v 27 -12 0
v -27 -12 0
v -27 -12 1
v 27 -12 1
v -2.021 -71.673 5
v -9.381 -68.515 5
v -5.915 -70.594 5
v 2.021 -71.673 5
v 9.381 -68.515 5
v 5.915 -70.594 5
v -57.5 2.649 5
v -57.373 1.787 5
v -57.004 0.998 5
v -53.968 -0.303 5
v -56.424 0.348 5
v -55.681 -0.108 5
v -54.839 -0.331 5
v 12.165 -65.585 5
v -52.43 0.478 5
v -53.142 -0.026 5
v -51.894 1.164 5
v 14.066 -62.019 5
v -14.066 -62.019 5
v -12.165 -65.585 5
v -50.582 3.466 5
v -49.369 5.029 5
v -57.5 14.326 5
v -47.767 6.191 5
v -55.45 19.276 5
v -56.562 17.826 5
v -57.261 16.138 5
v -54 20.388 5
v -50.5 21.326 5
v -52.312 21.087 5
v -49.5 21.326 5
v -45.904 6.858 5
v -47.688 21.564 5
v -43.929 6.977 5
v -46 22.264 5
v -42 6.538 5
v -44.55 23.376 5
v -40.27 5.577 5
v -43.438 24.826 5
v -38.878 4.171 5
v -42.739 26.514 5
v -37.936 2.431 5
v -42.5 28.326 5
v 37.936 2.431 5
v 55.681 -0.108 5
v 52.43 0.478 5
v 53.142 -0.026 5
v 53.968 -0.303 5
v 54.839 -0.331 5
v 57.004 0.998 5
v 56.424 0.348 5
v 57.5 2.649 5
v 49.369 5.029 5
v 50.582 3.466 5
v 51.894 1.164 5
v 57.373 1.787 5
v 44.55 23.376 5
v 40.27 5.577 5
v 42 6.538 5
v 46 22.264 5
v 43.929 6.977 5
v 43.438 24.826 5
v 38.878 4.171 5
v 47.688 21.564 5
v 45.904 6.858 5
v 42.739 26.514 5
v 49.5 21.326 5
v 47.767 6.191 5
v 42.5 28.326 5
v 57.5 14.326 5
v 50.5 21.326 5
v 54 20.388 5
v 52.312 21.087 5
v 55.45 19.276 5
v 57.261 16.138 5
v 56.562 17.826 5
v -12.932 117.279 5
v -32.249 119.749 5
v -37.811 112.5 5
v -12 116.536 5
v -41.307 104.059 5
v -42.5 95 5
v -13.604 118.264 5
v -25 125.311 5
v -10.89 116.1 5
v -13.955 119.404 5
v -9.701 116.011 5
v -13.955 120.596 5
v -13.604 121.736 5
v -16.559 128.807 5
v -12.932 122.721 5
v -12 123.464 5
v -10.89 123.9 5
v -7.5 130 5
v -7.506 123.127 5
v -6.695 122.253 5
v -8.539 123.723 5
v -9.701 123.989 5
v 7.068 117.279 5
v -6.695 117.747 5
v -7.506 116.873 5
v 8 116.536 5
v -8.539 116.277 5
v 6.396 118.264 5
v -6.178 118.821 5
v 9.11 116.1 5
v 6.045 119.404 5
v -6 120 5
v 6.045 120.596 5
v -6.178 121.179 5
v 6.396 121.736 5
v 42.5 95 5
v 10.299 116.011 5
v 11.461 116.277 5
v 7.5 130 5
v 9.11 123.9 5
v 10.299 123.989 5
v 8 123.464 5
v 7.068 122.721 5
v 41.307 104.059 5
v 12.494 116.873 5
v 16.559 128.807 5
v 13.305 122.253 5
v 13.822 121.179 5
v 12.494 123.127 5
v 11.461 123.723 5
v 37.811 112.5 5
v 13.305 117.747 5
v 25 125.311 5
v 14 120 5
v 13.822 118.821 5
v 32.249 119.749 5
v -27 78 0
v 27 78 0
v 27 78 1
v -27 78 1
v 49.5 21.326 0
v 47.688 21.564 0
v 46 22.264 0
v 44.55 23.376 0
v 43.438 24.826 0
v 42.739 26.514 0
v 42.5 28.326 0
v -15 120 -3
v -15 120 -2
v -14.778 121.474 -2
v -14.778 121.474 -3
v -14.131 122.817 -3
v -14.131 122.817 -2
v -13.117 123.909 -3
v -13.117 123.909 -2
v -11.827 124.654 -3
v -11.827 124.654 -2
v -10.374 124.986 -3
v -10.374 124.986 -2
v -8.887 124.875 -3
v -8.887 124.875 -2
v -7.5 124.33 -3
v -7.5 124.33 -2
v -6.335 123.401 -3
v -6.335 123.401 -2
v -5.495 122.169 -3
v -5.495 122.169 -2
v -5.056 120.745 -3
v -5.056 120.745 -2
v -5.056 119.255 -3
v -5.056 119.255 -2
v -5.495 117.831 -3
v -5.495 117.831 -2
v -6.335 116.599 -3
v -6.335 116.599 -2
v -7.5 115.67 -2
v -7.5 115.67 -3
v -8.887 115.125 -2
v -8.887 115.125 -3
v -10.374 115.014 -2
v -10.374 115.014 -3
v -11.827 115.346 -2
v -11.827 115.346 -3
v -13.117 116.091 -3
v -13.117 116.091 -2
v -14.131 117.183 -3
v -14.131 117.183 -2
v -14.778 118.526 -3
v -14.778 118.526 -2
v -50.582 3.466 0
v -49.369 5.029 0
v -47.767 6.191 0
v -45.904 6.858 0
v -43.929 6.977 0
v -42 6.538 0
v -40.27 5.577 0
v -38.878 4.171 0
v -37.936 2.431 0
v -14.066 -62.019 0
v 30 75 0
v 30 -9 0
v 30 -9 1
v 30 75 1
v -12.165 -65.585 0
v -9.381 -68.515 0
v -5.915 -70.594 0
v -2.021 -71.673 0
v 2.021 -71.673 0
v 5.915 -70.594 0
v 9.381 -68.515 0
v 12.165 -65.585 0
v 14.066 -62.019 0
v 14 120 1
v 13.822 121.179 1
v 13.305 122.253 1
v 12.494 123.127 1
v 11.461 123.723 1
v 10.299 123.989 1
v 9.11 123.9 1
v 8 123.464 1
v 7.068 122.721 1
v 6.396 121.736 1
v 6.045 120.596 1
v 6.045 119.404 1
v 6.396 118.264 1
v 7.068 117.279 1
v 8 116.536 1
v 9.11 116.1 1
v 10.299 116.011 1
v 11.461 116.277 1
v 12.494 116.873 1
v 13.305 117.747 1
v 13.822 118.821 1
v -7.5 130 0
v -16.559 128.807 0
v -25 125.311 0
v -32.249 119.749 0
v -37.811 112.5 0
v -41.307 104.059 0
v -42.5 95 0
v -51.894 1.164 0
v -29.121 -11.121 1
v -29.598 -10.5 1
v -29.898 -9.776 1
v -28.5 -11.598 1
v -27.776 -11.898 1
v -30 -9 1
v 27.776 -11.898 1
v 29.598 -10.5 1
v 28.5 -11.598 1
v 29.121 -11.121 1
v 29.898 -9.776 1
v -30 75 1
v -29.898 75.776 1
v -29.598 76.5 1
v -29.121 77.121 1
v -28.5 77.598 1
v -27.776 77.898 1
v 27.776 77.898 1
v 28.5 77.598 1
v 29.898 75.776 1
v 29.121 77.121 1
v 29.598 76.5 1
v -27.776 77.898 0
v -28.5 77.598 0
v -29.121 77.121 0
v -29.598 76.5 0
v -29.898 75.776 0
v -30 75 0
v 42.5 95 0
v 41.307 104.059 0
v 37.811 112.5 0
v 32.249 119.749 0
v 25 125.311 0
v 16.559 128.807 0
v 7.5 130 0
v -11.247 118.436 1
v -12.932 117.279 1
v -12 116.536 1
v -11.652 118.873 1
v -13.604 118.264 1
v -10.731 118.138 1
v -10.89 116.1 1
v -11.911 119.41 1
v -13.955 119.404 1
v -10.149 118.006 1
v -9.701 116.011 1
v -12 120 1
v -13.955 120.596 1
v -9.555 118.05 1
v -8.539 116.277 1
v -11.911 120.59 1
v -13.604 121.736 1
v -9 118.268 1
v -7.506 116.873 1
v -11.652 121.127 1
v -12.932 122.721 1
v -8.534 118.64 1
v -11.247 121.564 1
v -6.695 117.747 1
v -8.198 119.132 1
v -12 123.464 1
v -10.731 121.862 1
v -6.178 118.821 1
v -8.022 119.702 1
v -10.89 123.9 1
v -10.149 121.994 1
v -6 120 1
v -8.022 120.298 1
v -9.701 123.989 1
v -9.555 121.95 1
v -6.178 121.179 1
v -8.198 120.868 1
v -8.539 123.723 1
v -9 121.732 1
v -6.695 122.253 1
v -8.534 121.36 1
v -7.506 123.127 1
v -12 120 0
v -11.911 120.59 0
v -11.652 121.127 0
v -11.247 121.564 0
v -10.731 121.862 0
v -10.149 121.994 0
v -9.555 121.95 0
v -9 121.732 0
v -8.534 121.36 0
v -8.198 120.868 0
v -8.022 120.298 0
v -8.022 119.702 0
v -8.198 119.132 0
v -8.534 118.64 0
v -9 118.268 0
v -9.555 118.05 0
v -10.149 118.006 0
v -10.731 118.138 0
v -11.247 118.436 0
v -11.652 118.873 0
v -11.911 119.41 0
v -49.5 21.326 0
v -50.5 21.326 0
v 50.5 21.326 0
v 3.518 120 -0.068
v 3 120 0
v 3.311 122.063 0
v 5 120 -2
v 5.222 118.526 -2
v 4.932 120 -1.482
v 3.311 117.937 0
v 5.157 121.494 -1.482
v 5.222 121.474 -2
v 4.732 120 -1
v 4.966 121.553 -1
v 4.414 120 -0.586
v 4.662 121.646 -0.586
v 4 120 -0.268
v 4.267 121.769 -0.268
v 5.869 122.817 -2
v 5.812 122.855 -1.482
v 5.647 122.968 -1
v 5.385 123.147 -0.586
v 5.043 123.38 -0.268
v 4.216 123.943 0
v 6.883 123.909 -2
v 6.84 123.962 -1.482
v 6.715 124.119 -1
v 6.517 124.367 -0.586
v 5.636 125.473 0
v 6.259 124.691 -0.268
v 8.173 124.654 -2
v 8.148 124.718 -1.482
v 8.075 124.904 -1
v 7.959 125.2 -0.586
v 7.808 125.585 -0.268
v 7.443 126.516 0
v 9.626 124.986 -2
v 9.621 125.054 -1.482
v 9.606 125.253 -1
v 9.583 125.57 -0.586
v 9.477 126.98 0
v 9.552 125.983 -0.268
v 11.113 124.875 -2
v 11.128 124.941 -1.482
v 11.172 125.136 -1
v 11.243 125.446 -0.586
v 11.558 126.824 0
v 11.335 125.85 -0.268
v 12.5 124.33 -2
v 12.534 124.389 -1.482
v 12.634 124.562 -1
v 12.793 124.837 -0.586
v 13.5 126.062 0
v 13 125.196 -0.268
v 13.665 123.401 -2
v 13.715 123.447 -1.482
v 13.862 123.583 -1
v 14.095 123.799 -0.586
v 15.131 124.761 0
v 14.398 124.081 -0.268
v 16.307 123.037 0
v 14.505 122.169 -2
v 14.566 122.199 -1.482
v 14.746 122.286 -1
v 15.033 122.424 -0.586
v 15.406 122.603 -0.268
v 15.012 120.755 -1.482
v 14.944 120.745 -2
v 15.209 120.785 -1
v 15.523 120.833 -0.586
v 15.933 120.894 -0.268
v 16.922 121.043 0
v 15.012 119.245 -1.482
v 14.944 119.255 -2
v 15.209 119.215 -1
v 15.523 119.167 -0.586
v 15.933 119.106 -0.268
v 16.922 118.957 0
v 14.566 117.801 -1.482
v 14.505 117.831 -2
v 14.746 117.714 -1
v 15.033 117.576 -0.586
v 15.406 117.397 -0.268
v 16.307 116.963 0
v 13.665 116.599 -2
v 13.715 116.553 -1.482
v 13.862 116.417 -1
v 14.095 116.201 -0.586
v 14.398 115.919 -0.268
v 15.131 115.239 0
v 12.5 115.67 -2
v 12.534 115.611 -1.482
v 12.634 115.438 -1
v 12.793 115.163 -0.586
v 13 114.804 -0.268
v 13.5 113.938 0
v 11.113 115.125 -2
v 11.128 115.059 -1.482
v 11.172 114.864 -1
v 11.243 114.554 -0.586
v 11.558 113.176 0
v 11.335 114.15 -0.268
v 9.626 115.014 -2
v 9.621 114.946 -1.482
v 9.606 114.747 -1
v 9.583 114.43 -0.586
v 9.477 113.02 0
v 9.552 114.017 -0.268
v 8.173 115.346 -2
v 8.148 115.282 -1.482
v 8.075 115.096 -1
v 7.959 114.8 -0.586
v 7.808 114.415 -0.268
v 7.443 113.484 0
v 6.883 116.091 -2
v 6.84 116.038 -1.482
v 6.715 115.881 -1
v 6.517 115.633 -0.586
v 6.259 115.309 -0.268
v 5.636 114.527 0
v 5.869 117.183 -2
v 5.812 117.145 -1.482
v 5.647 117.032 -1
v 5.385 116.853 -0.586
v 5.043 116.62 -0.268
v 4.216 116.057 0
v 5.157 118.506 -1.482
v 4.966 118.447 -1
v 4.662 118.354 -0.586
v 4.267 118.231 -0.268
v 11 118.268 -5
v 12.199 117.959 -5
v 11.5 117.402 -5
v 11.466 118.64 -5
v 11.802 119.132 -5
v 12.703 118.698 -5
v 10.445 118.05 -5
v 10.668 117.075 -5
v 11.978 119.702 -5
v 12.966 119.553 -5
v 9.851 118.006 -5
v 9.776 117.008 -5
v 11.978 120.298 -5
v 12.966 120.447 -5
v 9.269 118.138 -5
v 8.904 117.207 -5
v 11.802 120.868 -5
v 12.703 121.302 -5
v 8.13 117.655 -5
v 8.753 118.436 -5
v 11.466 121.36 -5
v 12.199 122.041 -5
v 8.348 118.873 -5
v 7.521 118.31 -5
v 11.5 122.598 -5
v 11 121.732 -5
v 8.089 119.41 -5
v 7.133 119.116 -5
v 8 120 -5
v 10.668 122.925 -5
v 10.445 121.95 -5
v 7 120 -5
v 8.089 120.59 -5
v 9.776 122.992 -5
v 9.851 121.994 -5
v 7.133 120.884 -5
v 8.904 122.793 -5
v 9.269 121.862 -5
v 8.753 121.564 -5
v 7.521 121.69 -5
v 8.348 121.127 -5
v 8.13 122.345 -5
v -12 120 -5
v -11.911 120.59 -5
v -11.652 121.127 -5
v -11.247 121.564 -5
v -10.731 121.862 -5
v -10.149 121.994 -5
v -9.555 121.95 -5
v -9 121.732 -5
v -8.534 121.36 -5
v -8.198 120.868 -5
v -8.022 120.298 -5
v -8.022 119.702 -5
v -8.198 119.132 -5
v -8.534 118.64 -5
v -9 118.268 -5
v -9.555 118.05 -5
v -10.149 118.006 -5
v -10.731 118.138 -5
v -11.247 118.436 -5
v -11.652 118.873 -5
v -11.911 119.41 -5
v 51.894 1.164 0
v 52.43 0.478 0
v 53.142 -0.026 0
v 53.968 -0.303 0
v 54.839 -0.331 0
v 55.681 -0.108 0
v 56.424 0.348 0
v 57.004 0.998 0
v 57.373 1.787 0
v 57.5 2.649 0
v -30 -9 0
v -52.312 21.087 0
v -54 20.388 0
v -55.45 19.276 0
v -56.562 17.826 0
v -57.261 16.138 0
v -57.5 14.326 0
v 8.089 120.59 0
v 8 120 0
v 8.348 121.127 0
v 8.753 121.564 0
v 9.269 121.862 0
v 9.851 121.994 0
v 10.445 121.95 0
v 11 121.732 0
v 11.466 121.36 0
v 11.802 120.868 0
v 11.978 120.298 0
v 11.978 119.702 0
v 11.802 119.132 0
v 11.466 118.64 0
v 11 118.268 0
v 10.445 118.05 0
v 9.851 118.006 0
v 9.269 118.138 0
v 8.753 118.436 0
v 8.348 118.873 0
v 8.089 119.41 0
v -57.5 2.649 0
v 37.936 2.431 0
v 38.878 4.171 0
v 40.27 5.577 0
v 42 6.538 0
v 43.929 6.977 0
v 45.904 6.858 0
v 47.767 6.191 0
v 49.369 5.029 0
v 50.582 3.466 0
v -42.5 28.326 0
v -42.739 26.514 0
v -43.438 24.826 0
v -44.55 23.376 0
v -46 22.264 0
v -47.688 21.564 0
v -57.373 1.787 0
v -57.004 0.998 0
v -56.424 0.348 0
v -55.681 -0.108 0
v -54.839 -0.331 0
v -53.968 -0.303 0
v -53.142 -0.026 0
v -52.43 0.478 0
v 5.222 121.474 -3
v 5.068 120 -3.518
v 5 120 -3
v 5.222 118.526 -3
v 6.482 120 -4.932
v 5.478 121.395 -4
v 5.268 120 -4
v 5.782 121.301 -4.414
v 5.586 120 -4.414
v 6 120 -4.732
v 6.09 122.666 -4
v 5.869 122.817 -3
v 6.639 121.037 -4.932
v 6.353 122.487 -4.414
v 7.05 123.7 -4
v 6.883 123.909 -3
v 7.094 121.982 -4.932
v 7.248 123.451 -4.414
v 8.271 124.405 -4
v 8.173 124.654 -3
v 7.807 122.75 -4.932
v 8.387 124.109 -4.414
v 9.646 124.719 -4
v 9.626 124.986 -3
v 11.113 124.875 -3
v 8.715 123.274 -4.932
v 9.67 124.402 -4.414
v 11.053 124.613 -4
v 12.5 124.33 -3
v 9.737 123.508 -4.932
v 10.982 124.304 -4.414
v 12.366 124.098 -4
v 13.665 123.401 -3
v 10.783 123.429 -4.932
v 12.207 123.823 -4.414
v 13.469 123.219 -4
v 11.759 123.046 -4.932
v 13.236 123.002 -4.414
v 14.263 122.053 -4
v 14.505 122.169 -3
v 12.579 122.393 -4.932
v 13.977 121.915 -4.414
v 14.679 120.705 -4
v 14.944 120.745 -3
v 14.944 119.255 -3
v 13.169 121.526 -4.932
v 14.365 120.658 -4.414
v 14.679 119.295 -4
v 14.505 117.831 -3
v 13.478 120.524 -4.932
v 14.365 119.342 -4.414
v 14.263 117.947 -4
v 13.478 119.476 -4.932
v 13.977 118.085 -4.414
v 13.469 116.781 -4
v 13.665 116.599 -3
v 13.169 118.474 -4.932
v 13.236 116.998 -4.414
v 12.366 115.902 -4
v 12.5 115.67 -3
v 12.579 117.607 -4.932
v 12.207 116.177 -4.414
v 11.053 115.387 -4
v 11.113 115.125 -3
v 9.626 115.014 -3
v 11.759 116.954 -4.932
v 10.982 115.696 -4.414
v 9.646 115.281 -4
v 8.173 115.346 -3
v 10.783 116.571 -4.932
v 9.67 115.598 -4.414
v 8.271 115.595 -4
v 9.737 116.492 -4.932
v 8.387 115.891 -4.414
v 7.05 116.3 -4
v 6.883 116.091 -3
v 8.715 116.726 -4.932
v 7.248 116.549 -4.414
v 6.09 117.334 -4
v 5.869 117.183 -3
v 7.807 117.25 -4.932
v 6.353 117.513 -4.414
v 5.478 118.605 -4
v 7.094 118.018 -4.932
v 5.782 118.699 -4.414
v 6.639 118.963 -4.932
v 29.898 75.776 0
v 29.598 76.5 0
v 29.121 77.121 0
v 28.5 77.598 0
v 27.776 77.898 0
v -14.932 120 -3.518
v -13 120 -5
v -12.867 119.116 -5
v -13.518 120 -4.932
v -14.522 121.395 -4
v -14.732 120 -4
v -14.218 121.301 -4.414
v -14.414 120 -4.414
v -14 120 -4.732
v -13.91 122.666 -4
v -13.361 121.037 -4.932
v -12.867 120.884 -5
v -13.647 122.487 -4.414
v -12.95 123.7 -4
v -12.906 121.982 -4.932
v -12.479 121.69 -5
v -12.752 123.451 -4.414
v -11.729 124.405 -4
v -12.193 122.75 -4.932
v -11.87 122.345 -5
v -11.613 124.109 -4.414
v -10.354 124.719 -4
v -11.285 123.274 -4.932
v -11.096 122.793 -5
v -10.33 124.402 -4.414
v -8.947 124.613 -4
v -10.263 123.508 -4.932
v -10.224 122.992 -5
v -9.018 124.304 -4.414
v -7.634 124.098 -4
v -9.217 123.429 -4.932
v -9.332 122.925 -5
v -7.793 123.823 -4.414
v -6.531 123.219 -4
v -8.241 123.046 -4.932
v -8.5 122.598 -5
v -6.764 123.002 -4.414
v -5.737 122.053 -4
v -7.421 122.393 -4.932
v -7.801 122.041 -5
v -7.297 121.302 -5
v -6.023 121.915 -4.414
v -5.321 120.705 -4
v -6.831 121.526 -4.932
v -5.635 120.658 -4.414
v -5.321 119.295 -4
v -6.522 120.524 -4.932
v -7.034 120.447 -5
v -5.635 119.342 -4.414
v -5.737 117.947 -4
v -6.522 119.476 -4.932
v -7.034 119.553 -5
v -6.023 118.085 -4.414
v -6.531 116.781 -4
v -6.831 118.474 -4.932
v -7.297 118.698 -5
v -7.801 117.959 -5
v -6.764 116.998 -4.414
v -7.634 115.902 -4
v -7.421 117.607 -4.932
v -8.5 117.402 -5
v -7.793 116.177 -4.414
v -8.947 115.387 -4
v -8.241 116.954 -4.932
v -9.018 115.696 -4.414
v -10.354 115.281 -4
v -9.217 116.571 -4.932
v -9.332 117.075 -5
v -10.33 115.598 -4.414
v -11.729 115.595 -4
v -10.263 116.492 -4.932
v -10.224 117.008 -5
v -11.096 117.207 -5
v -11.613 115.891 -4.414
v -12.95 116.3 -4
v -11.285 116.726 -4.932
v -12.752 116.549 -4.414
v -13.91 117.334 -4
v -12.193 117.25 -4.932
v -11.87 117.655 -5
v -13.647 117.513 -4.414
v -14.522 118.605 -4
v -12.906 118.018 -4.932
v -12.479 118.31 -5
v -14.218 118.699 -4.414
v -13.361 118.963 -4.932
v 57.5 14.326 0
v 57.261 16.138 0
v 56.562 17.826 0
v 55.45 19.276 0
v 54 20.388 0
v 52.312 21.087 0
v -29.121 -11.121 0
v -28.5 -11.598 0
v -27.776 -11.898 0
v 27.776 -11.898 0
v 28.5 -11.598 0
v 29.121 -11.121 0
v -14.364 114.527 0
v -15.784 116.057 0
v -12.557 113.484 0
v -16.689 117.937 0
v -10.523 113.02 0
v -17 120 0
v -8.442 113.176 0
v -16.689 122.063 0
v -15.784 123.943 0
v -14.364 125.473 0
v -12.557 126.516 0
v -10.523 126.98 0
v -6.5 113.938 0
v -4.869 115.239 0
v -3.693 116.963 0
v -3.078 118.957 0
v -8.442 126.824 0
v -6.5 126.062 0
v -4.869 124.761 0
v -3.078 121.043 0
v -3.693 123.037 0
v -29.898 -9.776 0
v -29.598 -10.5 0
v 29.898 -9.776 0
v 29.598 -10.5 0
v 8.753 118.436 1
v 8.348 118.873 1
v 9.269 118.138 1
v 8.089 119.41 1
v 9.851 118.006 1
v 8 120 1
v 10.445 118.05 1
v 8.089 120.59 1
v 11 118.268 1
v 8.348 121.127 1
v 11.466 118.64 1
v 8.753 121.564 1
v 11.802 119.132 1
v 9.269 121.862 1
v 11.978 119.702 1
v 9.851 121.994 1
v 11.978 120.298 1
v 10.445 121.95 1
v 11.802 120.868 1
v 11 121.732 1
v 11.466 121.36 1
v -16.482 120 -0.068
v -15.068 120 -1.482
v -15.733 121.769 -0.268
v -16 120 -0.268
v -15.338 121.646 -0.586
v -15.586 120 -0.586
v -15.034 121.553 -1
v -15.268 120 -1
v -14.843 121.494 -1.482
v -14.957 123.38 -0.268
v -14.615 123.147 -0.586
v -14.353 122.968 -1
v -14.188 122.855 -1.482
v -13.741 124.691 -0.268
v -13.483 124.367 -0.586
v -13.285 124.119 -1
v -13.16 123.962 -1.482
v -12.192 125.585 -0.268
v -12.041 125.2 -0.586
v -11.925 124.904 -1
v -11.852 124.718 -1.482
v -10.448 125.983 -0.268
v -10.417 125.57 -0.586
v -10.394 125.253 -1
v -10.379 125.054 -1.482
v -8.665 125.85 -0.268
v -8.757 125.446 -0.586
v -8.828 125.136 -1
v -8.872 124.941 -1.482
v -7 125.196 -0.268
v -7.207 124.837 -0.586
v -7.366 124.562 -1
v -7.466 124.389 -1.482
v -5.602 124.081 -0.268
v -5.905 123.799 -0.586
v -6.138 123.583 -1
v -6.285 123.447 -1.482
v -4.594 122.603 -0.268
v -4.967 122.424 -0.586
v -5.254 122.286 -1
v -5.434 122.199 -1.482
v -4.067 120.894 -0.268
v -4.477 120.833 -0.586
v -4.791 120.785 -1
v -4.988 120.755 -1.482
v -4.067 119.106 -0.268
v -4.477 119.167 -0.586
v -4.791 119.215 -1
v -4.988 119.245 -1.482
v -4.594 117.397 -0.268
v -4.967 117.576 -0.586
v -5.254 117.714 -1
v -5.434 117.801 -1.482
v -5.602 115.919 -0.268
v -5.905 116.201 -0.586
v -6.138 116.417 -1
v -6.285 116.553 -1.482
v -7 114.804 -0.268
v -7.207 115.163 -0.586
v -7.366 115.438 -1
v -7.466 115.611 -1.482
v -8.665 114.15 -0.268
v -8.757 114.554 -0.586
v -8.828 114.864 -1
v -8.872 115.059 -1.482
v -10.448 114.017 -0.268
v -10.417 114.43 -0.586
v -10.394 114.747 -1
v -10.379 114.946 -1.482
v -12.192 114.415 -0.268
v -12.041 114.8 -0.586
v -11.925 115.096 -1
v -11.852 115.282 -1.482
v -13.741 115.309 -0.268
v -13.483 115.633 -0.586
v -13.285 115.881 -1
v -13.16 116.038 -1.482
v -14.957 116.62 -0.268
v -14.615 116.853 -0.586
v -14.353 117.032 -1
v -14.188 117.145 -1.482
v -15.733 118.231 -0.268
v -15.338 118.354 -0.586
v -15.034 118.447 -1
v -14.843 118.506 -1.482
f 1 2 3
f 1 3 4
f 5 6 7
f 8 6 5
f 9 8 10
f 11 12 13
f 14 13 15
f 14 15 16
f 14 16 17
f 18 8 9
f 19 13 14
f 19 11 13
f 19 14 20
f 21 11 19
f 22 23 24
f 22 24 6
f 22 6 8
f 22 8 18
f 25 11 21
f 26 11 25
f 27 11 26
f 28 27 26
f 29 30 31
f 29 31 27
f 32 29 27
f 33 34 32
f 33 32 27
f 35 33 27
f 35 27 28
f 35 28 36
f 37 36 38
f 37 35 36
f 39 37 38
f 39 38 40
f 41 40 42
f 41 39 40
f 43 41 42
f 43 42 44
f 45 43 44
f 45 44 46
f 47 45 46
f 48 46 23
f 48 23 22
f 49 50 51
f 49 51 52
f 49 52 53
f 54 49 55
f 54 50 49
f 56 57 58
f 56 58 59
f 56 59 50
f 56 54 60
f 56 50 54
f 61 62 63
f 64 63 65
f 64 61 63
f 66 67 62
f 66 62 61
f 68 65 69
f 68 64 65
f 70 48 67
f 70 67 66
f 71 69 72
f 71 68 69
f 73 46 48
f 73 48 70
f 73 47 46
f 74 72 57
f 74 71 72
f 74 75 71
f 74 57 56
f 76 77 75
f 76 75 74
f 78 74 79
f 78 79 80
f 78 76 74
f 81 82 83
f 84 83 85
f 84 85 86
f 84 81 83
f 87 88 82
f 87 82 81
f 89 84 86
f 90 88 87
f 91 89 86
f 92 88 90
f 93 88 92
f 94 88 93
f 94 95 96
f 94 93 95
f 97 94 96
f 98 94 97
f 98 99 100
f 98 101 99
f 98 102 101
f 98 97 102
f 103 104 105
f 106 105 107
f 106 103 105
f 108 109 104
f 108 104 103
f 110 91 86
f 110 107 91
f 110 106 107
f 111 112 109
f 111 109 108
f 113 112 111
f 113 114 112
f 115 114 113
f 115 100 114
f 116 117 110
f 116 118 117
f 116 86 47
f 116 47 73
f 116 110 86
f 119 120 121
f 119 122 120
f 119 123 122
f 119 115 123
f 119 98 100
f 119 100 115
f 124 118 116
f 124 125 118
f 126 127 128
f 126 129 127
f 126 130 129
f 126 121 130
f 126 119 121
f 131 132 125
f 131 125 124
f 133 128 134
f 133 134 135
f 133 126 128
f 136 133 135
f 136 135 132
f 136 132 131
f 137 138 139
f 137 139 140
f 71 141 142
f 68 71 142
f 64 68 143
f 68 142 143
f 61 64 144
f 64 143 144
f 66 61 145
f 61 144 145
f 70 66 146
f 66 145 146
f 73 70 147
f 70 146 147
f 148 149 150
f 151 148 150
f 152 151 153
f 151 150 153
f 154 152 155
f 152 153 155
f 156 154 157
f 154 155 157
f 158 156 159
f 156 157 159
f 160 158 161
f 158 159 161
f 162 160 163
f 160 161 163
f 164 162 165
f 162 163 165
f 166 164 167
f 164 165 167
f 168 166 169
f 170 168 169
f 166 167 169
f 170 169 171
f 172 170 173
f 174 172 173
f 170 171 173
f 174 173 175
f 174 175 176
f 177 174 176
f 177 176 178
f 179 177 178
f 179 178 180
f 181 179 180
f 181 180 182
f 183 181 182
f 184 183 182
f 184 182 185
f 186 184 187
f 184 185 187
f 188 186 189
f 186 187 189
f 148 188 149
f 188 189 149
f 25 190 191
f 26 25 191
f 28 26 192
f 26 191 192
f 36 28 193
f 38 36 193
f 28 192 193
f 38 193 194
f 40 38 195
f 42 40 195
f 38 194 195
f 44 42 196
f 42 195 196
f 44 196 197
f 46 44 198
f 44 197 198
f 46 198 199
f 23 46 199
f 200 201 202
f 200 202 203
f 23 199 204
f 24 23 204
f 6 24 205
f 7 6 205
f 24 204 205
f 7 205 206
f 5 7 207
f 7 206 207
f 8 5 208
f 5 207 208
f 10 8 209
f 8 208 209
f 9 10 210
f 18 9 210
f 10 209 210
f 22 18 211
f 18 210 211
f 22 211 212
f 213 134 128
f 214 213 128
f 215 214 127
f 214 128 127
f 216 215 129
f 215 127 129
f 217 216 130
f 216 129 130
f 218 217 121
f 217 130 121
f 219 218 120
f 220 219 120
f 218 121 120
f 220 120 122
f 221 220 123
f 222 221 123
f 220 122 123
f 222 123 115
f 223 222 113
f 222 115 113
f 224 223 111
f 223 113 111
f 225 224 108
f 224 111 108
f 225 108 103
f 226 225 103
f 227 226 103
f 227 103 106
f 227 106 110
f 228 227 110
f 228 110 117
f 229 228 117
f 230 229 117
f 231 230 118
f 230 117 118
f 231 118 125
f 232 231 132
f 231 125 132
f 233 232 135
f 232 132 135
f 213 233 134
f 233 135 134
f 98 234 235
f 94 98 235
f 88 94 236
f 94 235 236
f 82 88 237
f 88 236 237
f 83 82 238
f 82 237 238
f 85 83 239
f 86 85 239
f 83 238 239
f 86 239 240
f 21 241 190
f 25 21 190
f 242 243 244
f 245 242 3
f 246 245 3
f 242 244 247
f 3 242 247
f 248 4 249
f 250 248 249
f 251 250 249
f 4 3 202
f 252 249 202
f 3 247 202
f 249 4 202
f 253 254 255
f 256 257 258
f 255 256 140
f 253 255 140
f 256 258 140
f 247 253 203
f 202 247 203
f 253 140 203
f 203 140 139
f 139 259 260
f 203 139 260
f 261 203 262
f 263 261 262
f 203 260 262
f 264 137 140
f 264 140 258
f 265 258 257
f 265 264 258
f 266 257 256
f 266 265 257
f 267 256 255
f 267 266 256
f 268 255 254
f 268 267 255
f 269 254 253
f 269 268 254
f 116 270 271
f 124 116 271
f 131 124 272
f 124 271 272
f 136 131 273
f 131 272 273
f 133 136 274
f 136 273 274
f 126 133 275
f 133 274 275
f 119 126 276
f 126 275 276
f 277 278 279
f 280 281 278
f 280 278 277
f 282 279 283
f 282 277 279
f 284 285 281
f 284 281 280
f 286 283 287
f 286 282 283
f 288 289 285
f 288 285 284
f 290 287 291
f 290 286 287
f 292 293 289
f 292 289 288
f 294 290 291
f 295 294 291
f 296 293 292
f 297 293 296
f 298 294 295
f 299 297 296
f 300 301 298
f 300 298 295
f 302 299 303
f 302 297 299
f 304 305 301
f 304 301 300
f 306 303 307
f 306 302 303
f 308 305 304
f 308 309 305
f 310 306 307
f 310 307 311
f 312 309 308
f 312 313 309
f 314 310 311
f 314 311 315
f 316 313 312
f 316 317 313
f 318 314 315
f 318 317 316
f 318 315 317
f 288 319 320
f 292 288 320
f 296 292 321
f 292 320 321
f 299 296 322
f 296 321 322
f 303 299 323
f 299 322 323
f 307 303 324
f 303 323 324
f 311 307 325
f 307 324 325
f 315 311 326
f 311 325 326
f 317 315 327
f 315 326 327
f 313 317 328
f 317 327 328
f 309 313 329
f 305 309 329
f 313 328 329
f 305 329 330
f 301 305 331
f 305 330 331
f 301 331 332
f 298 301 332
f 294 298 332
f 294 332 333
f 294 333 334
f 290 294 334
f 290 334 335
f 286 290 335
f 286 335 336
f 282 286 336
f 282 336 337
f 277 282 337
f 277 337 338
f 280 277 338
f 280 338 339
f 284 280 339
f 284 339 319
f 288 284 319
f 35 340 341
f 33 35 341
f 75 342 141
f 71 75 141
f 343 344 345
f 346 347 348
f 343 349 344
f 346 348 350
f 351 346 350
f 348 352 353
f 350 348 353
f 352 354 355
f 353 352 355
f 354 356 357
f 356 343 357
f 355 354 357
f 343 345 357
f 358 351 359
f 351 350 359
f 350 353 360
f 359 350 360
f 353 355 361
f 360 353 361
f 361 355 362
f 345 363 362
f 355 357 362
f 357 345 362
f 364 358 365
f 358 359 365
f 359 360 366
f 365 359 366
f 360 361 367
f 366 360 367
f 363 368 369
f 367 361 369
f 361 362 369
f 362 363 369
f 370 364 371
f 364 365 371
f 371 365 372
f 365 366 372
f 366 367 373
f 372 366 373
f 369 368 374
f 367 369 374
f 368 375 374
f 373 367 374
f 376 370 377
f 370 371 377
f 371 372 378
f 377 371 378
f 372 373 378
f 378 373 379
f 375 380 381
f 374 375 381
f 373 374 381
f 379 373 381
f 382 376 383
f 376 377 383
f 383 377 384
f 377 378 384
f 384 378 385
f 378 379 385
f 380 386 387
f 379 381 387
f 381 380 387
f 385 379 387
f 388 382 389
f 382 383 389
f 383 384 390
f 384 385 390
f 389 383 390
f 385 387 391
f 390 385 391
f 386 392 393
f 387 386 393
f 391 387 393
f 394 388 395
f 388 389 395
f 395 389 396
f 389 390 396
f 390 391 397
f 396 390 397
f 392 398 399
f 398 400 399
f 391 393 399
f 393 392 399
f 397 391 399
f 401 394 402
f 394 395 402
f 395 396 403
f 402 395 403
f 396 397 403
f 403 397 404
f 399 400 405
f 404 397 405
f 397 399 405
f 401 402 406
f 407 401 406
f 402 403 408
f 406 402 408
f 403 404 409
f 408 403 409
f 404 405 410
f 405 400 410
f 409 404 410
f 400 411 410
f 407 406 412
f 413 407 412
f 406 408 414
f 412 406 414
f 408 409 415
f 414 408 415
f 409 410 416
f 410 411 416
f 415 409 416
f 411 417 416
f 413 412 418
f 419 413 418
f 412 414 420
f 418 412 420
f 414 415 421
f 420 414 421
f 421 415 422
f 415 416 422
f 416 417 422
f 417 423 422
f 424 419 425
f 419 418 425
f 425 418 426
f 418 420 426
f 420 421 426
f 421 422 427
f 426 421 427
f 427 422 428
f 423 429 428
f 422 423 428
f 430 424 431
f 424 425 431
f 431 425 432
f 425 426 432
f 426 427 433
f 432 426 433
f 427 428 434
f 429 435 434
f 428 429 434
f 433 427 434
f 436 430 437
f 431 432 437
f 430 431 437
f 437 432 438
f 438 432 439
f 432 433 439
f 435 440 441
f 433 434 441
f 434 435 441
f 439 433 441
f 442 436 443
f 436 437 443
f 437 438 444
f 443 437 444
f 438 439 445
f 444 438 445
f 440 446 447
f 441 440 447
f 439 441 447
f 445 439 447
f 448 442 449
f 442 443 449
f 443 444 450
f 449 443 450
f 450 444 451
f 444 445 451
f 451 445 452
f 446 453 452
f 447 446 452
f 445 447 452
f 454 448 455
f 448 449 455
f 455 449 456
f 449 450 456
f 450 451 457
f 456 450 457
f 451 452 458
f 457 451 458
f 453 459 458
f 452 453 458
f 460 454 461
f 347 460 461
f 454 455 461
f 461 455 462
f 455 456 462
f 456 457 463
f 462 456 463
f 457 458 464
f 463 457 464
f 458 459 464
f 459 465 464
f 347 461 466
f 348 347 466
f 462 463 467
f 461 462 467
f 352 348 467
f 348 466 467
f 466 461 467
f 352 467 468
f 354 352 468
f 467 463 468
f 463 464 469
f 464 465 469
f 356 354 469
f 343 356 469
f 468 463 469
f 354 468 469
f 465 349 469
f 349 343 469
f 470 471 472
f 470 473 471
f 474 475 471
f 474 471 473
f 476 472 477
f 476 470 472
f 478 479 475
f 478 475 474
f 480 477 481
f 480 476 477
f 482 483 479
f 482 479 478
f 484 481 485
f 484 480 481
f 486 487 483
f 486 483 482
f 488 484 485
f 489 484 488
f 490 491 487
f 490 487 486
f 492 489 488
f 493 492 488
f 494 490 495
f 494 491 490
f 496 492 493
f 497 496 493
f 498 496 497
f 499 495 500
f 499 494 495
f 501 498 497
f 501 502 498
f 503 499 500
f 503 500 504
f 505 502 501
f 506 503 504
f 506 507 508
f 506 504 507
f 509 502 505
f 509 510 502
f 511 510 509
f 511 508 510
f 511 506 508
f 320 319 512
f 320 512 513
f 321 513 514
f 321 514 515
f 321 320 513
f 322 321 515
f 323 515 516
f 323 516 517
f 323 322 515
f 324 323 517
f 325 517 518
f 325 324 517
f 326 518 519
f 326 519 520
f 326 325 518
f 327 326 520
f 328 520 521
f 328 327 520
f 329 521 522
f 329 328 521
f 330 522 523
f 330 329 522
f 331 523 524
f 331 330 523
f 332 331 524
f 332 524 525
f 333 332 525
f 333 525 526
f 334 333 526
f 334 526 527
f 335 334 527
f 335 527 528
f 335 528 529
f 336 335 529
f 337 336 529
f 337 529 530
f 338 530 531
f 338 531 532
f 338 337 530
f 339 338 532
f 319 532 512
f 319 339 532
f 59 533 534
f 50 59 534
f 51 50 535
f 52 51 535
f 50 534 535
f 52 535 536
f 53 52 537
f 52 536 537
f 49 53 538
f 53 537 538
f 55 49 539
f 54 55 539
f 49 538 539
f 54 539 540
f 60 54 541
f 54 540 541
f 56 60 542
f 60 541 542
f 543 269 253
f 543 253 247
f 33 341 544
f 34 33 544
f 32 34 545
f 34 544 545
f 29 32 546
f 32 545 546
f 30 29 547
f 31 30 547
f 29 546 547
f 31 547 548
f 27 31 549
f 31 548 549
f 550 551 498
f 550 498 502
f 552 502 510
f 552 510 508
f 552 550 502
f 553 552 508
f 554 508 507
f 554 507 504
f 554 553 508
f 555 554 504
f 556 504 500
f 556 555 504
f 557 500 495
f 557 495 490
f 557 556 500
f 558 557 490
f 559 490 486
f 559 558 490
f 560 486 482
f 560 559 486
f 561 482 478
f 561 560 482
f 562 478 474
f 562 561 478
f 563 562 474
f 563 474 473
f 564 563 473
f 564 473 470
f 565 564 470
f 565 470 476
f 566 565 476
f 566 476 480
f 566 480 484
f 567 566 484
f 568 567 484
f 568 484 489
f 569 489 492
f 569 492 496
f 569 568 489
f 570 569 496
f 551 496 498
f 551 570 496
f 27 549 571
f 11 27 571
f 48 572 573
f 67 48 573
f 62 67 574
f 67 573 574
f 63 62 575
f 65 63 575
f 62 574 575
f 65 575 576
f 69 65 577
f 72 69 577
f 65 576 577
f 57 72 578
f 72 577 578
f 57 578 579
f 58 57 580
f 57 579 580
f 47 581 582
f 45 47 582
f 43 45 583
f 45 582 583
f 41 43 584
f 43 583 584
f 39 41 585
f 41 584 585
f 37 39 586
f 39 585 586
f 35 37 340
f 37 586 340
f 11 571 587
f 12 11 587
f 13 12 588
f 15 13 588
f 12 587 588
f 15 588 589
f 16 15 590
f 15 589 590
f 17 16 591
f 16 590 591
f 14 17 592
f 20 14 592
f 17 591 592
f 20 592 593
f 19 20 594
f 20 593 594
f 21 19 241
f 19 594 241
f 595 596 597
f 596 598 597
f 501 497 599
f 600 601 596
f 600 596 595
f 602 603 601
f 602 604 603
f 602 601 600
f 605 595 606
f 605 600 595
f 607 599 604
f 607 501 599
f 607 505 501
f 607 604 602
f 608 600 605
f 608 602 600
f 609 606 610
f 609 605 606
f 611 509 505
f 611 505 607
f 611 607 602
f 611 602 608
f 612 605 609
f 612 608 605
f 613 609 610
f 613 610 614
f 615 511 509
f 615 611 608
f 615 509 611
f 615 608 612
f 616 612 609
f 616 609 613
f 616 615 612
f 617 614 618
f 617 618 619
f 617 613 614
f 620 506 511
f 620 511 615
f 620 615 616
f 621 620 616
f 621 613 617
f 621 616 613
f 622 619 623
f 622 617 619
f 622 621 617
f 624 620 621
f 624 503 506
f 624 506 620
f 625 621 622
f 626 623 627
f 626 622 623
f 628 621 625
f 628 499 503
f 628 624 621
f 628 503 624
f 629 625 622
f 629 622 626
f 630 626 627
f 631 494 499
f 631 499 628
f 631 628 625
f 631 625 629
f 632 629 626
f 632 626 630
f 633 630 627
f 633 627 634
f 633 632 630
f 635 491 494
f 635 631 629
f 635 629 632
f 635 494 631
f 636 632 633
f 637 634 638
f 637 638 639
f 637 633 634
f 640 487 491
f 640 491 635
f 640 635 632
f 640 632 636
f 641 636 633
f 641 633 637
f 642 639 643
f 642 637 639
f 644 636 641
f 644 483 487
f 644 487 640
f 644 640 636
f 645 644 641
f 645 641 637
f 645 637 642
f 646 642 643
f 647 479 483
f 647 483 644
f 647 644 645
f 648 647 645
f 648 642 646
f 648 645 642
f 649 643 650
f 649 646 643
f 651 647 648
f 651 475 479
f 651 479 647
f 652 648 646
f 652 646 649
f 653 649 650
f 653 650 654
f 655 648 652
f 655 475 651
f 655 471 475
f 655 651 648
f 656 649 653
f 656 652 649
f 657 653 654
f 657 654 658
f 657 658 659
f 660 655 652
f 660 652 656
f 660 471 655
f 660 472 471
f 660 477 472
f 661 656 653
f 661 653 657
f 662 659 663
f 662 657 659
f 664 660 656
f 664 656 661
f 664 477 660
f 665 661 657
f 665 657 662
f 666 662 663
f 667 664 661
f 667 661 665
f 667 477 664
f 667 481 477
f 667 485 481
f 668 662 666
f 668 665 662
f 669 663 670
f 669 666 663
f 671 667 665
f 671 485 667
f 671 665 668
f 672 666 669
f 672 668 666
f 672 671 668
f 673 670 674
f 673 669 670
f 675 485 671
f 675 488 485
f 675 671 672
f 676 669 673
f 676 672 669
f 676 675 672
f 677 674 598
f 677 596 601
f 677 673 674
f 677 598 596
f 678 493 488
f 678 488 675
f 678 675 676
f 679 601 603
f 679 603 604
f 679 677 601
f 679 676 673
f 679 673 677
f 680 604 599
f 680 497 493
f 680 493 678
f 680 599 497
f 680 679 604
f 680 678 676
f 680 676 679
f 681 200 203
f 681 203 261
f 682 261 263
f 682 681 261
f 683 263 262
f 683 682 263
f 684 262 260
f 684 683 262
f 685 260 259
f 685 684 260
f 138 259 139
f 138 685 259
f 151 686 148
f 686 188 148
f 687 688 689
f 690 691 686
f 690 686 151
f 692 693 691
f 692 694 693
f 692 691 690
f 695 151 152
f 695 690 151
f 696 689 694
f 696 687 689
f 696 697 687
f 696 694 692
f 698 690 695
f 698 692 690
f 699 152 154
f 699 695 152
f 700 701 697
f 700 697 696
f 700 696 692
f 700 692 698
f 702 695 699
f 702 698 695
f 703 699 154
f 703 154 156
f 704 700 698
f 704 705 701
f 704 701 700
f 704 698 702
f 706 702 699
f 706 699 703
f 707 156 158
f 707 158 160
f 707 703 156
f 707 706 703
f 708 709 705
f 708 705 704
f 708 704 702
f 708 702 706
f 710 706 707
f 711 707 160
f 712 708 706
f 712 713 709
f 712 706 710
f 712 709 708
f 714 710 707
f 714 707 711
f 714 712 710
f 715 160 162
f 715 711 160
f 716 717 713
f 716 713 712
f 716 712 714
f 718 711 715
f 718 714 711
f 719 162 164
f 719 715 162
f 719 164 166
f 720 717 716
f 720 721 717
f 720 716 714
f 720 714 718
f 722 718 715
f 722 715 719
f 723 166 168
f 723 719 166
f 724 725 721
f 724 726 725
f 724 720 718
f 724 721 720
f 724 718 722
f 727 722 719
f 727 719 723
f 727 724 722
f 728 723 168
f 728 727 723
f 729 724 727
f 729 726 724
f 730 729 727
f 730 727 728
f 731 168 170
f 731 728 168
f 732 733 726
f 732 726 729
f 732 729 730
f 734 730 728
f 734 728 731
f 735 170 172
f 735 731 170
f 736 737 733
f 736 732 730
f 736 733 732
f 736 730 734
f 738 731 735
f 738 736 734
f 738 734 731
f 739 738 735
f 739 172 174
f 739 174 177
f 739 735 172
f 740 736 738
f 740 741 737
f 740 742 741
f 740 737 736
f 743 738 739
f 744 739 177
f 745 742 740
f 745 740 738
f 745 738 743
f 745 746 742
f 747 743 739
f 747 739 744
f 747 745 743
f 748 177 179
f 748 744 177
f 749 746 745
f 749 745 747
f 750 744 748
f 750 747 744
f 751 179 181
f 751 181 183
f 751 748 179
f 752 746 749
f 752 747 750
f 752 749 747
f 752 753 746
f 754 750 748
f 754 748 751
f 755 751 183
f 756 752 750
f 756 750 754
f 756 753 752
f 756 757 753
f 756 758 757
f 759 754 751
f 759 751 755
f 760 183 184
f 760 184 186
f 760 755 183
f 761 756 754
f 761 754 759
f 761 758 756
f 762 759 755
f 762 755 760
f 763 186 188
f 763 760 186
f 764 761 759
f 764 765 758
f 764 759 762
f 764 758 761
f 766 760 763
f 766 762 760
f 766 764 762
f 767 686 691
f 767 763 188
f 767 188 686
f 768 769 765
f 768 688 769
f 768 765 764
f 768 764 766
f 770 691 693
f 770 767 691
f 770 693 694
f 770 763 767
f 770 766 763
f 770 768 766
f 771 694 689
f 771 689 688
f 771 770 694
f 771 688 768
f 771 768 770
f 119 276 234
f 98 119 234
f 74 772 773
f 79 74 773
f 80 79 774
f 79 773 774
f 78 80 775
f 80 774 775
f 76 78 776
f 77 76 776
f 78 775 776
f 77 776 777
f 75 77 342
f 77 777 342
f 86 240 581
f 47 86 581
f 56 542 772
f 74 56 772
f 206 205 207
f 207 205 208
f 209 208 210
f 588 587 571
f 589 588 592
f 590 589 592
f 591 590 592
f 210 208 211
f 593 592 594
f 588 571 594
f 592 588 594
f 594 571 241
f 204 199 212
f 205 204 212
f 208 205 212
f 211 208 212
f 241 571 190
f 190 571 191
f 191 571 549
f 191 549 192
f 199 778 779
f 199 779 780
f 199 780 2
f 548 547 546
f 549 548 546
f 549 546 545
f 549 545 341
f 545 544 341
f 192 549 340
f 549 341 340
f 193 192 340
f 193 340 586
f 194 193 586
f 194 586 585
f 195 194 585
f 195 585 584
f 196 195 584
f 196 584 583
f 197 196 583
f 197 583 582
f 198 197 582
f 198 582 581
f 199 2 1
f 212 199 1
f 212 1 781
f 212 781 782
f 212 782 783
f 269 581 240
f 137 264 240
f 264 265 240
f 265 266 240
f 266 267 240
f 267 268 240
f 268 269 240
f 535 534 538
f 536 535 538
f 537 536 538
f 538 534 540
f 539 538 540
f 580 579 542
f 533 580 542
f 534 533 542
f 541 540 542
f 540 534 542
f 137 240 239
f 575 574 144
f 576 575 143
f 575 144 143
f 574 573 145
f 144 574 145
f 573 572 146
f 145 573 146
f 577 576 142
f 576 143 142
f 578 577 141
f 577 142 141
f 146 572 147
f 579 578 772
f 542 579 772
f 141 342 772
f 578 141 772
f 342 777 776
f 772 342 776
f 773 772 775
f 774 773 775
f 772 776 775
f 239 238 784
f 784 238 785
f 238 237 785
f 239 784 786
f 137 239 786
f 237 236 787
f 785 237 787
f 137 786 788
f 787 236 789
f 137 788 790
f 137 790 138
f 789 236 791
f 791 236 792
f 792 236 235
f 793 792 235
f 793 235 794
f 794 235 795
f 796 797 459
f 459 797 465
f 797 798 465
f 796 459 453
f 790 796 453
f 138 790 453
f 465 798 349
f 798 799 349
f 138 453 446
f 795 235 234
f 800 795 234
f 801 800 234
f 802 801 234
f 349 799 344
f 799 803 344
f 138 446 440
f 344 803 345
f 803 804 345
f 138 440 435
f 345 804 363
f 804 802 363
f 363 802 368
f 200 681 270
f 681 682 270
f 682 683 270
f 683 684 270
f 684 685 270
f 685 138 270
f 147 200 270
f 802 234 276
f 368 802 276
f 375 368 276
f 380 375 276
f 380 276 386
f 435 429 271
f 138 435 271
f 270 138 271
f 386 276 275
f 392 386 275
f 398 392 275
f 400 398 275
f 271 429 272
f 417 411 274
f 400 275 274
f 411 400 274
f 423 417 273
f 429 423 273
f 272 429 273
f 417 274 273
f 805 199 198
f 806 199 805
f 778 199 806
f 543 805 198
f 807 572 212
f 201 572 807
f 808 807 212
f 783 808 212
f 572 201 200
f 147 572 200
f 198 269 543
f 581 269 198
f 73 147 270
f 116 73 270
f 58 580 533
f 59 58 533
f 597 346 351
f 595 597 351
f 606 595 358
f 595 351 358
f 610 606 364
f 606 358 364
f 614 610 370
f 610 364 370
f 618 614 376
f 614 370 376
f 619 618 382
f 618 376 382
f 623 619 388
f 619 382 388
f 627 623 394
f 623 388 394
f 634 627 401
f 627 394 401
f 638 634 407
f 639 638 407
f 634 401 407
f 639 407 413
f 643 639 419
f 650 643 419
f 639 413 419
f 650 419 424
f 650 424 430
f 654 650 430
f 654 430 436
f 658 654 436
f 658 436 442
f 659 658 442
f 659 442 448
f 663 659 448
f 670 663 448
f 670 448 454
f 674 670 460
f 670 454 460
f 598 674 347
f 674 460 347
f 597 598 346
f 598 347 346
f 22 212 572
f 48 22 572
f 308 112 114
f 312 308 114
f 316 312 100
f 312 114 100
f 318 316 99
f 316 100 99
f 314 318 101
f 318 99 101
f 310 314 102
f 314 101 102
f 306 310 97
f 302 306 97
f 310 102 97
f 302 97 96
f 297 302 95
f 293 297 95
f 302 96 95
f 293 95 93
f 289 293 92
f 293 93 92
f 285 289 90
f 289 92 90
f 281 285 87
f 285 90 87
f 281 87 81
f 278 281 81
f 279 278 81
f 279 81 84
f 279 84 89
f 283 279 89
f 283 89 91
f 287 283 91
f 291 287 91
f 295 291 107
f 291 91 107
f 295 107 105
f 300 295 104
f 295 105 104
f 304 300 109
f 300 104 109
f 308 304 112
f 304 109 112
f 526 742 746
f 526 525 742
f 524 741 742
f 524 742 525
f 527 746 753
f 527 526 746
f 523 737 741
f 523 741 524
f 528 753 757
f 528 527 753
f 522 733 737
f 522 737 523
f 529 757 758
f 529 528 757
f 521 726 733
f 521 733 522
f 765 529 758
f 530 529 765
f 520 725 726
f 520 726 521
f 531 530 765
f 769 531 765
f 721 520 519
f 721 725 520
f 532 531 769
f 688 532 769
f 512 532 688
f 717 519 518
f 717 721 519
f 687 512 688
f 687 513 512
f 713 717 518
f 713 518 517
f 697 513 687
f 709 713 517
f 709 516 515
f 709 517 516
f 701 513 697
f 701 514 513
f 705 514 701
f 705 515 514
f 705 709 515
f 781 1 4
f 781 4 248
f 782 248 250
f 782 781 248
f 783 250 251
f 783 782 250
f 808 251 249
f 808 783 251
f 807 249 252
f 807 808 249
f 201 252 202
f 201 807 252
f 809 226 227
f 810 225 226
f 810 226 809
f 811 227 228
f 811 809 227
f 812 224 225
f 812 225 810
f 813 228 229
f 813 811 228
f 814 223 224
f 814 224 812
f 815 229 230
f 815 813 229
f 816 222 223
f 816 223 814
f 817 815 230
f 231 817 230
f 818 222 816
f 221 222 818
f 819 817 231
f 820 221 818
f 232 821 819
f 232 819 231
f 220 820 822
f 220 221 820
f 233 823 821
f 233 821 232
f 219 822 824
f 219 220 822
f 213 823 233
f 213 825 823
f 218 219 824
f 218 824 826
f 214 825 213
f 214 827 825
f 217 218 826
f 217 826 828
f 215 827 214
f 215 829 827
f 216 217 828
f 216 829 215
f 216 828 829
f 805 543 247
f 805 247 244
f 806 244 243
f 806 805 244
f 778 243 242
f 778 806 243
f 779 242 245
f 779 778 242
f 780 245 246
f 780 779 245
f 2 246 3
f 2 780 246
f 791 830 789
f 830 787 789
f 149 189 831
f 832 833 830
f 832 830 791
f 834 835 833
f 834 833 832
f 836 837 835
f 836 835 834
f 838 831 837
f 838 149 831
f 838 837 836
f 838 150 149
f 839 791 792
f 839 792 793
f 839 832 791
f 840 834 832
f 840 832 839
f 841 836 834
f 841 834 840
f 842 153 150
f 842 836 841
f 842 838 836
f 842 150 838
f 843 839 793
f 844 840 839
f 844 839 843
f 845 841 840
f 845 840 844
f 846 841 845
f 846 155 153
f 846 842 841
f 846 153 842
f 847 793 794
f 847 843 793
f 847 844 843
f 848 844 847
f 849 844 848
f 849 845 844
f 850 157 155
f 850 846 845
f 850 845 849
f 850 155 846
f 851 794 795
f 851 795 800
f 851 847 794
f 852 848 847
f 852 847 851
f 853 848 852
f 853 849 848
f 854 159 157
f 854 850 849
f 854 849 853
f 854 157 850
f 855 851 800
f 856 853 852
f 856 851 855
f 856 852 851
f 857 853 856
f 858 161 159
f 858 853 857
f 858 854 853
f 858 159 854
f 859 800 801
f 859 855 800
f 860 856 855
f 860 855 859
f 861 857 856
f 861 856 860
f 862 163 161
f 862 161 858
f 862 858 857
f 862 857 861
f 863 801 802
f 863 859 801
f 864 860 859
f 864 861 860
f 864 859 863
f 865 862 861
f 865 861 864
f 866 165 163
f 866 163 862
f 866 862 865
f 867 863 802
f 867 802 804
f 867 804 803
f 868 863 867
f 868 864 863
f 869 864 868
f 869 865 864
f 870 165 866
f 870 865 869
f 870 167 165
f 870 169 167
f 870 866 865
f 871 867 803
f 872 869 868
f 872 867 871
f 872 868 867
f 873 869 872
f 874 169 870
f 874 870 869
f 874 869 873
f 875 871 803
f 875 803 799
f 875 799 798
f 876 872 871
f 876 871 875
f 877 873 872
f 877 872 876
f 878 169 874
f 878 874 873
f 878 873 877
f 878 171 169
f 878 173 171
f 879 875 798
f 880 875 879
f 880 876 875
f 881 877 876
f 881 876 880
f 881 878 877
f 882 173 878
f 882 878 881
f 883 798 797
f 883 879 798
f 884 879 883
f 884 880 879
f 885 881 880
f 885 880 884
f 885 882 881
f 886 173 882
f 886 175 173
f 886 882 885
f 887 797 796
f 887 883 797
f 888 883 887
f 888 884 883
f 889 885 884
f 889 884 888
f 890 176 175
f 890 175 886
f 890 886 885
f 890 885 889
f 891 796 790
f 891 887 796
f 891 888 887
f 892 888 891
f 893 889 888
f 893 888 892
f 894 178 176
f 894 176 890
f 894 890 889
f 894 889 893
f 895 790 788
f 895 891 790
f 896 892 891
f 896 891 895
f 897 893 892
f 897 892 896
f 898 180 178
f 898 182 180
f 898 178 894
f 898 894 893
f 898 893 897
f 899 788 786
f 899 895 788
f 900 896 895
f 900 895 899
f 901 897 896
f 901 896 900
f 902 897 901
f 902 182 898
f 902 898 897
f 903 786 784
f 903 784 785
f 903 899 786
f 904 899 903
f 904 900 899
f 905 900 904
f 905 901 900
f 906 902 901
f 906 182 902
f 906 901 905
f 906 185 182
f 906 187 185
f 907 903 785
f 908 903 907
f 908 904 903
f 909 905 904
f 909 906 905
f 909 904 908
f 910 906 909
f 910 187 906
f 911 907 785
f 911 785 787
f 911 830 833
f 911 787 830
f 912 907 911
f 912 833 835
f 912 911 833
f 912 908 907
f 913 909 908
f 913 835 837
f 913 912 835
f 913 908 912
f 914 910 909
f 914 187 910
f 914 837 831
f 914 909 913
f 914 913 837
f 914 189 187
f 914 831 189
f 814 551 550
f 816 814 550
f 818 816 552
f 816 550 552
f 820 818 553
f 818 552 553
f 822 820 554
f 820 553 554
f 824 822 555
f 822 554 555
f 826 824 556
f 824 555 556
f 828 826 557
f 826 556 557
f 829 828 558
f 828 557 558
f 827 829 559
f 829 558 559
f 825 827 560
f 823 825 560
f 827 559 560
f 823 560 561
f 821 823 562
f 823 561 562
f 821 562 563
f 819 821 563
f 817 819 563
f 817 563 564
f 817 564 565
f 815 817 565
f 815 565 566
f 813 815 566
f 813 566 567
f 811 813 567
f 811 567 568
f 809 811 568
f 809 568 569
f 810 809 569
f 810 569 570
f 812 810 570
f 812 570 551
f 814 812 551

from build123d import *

# Parameters (mm, degrees)
DODANIE_WYCI_GNI_CIE1_DEPTH = 5
WYTNIJ_WYCI_GNI_CIE1_DEPTH  = 1
SZKIC3_R                    = 2
WYTNIJ_WYCI_GNI_CIE2_DEPTH  = 5
SZKIC4_R                    = 4
WYTNIJ_WYCI_GNI_CIE3_DEPTH  = 4
SZKIC5_R                    = 5
SZKIC5_R_2                  = 2
DODANIE_WYCI_GNI_CIE2_DEPTH = 5
ZAOKR_GLENIE1_R             = 2


with BuildPart() as part:
    # Szkic1 → Dodanie-wyciągnięcie1 (new body)
    with BuildSketch(Plane.XY):
        with BuildLine():
            Line((-37.935722713, 2.431103393), (-14.066308471, -62.019242173))
            ThreePointArc((-14.066308471, -62.019242173), (0, -71.809734903), (14.066308471, -62.019242173))
            Line((14.066308471, -62.019242173), (37.935722713, 2.431103393))
            ThreePointArc((37.935722713, 2.431103393), (43.929144479, 6.976684311), (50.581769351, 3.465845))
            Line((50.581769351, 3.465845), (51.893527421, 1.164008066))
            ThreePointArc((51.893527421, 1.164008066), (55.268304062, -0.250579595), (57.5, 2.649370209))
            Line((57.5, 2.649370209), (57.5, 14.325924396))
            ThreePointArc((57.5, 14.325924396), (55.449747468, 19.275671864), (50.5, 21.325924396))
            Line((50.5, 21.325924396), (49.5, 21.325924396))
            ThreePointArc((49.5, 21.325924396), (44.550252532, 23.376176928), (42.5, 28.325924396))
            Line((42.5, 28.325924396), (42.5, 95))
            ThreePointArc((42.5, 95), (32.248737342, 119.748737342), (7.5, 130))
            Line((7.5, 130), (-7.5, 130))
            ThreePointArc((-7.5, 130), (-32.248737342, 119.748737342), (-42.5, 95))
            Line((-42.5, 95), (-42.5, 28.325924396))
            ThreePointArc((-42.5, 28.325924396), (-44.550252532, 23.376176928), (-49.5, 21.325924396))
            Line((-49.5, 21.325924396), (-50.5, 21.325924396))
            ThreePointArc((-50.5, 21.325924396), (-55.449747468, 19.275671864), (-57.5, 14.325924396))
            Line((-57.5, 14.325924396), (-57.5, 2.649370209))
            ThreePointArc((-57.5, 2.649370209), (-55.268304062, -0.250579595), (-51.893527421, 1.164008066))
            Line((-51.893527421, 1.164008066), (-50.581769351, 3.465845))
            ThreePointArc((-50.581769351, 3.465845), (-43.929144479, 6.976684311), (-37.935722713, 2.431103393))
        make_face()
    extrude(amount=DODANIE_WYCI_GNI_CIE1_DEPTH)

    # Szkic2 → Wytnij-wyciągnięcie1 (cut)
    with BuildSketch(Plane(origin=(0, 0, 0), x_dir=(-1, 0, 0), z_dir=(0, 0, -1))):
        with BuildLine():
            Line((-27, 78), (27, 78))
            ThreePointArc((27, 78), (29.121320344, 77.121320344), (30, 75))
            Line((30, 75), (30, -9))
            ThreePointArc((30, -9), (29.121320344, -11.121320344), (27, -12))
            Line((27, -12), (-27, -12))
            ThreePointArc((-27, -12), (-29.121320344, -11.121320344), (-30, -9))
            Line((-30, -9), (-30, 75))
            ThreePointArc((-30, 75), (-29.121320344, 77.121320344), (-27, 78))
        make_face()
    extrude(amount=-WYTNIJ_WYCI_GNI_CIE1_DEPTH, mode=Mode.SUBTRACT)

    # Szkic3 → Wytnij-wyciągnięcie2 (cut)
    with BuildSketch(Plane(origin=(0, 0, 0), x_dir=(-1, 0, 0), z_dir=(0, 0, -1))):
        with Locations((-10, 120)):
            Circle(SZKIC3_R)
        with Locations((10, 120)):
            Circle(SZKIC3_R)
    extrude(amount=-WYTNIJ_WYCI_GNI_CIE2_DEPTH, mode=Mode.SUBTRACT)

    # Szkic4 → Wytnij-wyciągnięcie3 (cut)
    with BuildSketch(Plane.XY.offset(5)):
        with Locations((-10, 120)):
            Circle(SZKIC4_R)
        with Locations((10, 120)):
            Circle(SZKIC4_R)
    extrude(amount=-WYTNIJ_WYCI_GNI_CIE3_DEPTH, mode=Mode.SUBTRACT)

    # Szkic5 → Dodanie-wyciągnięcie2 (add)
    with BuildSketch(Plane(origin=(0, 0, 0), x_dir=(-1, 0, 0), z_dir=(0, 0, -1))):
        with Locations((-10, 120)):
            Circle(SZKIC5_R)
        with Locations((-10, 120)):
            Circle(SZKIC5_R_2, mode=Mode.SUBTRACT)
        with Locations((10, 120)):
            Circle(SZKIC5_R)
        with Locations((10, 120)):
            Circle(SZKIC5_R_2, mode=Mode.SUBTRACT)
    extrude(amount=DODANIE_WYCI_GNI_CIE2_DEPTH)

    # Zaokrąglenie1
    zaokr_glenie1_edges = [part.edges().sort_by_distance(p)[0] for p in [
        (15, 120, -5),
        (15, 120, 0),
        (-5, 120, -5),
        (-5, 120, 0),
    ]]
    fillet(zaokr_glenie1_edges, radius=ZAOKR_GLENIE1_R)


solid = part.part
